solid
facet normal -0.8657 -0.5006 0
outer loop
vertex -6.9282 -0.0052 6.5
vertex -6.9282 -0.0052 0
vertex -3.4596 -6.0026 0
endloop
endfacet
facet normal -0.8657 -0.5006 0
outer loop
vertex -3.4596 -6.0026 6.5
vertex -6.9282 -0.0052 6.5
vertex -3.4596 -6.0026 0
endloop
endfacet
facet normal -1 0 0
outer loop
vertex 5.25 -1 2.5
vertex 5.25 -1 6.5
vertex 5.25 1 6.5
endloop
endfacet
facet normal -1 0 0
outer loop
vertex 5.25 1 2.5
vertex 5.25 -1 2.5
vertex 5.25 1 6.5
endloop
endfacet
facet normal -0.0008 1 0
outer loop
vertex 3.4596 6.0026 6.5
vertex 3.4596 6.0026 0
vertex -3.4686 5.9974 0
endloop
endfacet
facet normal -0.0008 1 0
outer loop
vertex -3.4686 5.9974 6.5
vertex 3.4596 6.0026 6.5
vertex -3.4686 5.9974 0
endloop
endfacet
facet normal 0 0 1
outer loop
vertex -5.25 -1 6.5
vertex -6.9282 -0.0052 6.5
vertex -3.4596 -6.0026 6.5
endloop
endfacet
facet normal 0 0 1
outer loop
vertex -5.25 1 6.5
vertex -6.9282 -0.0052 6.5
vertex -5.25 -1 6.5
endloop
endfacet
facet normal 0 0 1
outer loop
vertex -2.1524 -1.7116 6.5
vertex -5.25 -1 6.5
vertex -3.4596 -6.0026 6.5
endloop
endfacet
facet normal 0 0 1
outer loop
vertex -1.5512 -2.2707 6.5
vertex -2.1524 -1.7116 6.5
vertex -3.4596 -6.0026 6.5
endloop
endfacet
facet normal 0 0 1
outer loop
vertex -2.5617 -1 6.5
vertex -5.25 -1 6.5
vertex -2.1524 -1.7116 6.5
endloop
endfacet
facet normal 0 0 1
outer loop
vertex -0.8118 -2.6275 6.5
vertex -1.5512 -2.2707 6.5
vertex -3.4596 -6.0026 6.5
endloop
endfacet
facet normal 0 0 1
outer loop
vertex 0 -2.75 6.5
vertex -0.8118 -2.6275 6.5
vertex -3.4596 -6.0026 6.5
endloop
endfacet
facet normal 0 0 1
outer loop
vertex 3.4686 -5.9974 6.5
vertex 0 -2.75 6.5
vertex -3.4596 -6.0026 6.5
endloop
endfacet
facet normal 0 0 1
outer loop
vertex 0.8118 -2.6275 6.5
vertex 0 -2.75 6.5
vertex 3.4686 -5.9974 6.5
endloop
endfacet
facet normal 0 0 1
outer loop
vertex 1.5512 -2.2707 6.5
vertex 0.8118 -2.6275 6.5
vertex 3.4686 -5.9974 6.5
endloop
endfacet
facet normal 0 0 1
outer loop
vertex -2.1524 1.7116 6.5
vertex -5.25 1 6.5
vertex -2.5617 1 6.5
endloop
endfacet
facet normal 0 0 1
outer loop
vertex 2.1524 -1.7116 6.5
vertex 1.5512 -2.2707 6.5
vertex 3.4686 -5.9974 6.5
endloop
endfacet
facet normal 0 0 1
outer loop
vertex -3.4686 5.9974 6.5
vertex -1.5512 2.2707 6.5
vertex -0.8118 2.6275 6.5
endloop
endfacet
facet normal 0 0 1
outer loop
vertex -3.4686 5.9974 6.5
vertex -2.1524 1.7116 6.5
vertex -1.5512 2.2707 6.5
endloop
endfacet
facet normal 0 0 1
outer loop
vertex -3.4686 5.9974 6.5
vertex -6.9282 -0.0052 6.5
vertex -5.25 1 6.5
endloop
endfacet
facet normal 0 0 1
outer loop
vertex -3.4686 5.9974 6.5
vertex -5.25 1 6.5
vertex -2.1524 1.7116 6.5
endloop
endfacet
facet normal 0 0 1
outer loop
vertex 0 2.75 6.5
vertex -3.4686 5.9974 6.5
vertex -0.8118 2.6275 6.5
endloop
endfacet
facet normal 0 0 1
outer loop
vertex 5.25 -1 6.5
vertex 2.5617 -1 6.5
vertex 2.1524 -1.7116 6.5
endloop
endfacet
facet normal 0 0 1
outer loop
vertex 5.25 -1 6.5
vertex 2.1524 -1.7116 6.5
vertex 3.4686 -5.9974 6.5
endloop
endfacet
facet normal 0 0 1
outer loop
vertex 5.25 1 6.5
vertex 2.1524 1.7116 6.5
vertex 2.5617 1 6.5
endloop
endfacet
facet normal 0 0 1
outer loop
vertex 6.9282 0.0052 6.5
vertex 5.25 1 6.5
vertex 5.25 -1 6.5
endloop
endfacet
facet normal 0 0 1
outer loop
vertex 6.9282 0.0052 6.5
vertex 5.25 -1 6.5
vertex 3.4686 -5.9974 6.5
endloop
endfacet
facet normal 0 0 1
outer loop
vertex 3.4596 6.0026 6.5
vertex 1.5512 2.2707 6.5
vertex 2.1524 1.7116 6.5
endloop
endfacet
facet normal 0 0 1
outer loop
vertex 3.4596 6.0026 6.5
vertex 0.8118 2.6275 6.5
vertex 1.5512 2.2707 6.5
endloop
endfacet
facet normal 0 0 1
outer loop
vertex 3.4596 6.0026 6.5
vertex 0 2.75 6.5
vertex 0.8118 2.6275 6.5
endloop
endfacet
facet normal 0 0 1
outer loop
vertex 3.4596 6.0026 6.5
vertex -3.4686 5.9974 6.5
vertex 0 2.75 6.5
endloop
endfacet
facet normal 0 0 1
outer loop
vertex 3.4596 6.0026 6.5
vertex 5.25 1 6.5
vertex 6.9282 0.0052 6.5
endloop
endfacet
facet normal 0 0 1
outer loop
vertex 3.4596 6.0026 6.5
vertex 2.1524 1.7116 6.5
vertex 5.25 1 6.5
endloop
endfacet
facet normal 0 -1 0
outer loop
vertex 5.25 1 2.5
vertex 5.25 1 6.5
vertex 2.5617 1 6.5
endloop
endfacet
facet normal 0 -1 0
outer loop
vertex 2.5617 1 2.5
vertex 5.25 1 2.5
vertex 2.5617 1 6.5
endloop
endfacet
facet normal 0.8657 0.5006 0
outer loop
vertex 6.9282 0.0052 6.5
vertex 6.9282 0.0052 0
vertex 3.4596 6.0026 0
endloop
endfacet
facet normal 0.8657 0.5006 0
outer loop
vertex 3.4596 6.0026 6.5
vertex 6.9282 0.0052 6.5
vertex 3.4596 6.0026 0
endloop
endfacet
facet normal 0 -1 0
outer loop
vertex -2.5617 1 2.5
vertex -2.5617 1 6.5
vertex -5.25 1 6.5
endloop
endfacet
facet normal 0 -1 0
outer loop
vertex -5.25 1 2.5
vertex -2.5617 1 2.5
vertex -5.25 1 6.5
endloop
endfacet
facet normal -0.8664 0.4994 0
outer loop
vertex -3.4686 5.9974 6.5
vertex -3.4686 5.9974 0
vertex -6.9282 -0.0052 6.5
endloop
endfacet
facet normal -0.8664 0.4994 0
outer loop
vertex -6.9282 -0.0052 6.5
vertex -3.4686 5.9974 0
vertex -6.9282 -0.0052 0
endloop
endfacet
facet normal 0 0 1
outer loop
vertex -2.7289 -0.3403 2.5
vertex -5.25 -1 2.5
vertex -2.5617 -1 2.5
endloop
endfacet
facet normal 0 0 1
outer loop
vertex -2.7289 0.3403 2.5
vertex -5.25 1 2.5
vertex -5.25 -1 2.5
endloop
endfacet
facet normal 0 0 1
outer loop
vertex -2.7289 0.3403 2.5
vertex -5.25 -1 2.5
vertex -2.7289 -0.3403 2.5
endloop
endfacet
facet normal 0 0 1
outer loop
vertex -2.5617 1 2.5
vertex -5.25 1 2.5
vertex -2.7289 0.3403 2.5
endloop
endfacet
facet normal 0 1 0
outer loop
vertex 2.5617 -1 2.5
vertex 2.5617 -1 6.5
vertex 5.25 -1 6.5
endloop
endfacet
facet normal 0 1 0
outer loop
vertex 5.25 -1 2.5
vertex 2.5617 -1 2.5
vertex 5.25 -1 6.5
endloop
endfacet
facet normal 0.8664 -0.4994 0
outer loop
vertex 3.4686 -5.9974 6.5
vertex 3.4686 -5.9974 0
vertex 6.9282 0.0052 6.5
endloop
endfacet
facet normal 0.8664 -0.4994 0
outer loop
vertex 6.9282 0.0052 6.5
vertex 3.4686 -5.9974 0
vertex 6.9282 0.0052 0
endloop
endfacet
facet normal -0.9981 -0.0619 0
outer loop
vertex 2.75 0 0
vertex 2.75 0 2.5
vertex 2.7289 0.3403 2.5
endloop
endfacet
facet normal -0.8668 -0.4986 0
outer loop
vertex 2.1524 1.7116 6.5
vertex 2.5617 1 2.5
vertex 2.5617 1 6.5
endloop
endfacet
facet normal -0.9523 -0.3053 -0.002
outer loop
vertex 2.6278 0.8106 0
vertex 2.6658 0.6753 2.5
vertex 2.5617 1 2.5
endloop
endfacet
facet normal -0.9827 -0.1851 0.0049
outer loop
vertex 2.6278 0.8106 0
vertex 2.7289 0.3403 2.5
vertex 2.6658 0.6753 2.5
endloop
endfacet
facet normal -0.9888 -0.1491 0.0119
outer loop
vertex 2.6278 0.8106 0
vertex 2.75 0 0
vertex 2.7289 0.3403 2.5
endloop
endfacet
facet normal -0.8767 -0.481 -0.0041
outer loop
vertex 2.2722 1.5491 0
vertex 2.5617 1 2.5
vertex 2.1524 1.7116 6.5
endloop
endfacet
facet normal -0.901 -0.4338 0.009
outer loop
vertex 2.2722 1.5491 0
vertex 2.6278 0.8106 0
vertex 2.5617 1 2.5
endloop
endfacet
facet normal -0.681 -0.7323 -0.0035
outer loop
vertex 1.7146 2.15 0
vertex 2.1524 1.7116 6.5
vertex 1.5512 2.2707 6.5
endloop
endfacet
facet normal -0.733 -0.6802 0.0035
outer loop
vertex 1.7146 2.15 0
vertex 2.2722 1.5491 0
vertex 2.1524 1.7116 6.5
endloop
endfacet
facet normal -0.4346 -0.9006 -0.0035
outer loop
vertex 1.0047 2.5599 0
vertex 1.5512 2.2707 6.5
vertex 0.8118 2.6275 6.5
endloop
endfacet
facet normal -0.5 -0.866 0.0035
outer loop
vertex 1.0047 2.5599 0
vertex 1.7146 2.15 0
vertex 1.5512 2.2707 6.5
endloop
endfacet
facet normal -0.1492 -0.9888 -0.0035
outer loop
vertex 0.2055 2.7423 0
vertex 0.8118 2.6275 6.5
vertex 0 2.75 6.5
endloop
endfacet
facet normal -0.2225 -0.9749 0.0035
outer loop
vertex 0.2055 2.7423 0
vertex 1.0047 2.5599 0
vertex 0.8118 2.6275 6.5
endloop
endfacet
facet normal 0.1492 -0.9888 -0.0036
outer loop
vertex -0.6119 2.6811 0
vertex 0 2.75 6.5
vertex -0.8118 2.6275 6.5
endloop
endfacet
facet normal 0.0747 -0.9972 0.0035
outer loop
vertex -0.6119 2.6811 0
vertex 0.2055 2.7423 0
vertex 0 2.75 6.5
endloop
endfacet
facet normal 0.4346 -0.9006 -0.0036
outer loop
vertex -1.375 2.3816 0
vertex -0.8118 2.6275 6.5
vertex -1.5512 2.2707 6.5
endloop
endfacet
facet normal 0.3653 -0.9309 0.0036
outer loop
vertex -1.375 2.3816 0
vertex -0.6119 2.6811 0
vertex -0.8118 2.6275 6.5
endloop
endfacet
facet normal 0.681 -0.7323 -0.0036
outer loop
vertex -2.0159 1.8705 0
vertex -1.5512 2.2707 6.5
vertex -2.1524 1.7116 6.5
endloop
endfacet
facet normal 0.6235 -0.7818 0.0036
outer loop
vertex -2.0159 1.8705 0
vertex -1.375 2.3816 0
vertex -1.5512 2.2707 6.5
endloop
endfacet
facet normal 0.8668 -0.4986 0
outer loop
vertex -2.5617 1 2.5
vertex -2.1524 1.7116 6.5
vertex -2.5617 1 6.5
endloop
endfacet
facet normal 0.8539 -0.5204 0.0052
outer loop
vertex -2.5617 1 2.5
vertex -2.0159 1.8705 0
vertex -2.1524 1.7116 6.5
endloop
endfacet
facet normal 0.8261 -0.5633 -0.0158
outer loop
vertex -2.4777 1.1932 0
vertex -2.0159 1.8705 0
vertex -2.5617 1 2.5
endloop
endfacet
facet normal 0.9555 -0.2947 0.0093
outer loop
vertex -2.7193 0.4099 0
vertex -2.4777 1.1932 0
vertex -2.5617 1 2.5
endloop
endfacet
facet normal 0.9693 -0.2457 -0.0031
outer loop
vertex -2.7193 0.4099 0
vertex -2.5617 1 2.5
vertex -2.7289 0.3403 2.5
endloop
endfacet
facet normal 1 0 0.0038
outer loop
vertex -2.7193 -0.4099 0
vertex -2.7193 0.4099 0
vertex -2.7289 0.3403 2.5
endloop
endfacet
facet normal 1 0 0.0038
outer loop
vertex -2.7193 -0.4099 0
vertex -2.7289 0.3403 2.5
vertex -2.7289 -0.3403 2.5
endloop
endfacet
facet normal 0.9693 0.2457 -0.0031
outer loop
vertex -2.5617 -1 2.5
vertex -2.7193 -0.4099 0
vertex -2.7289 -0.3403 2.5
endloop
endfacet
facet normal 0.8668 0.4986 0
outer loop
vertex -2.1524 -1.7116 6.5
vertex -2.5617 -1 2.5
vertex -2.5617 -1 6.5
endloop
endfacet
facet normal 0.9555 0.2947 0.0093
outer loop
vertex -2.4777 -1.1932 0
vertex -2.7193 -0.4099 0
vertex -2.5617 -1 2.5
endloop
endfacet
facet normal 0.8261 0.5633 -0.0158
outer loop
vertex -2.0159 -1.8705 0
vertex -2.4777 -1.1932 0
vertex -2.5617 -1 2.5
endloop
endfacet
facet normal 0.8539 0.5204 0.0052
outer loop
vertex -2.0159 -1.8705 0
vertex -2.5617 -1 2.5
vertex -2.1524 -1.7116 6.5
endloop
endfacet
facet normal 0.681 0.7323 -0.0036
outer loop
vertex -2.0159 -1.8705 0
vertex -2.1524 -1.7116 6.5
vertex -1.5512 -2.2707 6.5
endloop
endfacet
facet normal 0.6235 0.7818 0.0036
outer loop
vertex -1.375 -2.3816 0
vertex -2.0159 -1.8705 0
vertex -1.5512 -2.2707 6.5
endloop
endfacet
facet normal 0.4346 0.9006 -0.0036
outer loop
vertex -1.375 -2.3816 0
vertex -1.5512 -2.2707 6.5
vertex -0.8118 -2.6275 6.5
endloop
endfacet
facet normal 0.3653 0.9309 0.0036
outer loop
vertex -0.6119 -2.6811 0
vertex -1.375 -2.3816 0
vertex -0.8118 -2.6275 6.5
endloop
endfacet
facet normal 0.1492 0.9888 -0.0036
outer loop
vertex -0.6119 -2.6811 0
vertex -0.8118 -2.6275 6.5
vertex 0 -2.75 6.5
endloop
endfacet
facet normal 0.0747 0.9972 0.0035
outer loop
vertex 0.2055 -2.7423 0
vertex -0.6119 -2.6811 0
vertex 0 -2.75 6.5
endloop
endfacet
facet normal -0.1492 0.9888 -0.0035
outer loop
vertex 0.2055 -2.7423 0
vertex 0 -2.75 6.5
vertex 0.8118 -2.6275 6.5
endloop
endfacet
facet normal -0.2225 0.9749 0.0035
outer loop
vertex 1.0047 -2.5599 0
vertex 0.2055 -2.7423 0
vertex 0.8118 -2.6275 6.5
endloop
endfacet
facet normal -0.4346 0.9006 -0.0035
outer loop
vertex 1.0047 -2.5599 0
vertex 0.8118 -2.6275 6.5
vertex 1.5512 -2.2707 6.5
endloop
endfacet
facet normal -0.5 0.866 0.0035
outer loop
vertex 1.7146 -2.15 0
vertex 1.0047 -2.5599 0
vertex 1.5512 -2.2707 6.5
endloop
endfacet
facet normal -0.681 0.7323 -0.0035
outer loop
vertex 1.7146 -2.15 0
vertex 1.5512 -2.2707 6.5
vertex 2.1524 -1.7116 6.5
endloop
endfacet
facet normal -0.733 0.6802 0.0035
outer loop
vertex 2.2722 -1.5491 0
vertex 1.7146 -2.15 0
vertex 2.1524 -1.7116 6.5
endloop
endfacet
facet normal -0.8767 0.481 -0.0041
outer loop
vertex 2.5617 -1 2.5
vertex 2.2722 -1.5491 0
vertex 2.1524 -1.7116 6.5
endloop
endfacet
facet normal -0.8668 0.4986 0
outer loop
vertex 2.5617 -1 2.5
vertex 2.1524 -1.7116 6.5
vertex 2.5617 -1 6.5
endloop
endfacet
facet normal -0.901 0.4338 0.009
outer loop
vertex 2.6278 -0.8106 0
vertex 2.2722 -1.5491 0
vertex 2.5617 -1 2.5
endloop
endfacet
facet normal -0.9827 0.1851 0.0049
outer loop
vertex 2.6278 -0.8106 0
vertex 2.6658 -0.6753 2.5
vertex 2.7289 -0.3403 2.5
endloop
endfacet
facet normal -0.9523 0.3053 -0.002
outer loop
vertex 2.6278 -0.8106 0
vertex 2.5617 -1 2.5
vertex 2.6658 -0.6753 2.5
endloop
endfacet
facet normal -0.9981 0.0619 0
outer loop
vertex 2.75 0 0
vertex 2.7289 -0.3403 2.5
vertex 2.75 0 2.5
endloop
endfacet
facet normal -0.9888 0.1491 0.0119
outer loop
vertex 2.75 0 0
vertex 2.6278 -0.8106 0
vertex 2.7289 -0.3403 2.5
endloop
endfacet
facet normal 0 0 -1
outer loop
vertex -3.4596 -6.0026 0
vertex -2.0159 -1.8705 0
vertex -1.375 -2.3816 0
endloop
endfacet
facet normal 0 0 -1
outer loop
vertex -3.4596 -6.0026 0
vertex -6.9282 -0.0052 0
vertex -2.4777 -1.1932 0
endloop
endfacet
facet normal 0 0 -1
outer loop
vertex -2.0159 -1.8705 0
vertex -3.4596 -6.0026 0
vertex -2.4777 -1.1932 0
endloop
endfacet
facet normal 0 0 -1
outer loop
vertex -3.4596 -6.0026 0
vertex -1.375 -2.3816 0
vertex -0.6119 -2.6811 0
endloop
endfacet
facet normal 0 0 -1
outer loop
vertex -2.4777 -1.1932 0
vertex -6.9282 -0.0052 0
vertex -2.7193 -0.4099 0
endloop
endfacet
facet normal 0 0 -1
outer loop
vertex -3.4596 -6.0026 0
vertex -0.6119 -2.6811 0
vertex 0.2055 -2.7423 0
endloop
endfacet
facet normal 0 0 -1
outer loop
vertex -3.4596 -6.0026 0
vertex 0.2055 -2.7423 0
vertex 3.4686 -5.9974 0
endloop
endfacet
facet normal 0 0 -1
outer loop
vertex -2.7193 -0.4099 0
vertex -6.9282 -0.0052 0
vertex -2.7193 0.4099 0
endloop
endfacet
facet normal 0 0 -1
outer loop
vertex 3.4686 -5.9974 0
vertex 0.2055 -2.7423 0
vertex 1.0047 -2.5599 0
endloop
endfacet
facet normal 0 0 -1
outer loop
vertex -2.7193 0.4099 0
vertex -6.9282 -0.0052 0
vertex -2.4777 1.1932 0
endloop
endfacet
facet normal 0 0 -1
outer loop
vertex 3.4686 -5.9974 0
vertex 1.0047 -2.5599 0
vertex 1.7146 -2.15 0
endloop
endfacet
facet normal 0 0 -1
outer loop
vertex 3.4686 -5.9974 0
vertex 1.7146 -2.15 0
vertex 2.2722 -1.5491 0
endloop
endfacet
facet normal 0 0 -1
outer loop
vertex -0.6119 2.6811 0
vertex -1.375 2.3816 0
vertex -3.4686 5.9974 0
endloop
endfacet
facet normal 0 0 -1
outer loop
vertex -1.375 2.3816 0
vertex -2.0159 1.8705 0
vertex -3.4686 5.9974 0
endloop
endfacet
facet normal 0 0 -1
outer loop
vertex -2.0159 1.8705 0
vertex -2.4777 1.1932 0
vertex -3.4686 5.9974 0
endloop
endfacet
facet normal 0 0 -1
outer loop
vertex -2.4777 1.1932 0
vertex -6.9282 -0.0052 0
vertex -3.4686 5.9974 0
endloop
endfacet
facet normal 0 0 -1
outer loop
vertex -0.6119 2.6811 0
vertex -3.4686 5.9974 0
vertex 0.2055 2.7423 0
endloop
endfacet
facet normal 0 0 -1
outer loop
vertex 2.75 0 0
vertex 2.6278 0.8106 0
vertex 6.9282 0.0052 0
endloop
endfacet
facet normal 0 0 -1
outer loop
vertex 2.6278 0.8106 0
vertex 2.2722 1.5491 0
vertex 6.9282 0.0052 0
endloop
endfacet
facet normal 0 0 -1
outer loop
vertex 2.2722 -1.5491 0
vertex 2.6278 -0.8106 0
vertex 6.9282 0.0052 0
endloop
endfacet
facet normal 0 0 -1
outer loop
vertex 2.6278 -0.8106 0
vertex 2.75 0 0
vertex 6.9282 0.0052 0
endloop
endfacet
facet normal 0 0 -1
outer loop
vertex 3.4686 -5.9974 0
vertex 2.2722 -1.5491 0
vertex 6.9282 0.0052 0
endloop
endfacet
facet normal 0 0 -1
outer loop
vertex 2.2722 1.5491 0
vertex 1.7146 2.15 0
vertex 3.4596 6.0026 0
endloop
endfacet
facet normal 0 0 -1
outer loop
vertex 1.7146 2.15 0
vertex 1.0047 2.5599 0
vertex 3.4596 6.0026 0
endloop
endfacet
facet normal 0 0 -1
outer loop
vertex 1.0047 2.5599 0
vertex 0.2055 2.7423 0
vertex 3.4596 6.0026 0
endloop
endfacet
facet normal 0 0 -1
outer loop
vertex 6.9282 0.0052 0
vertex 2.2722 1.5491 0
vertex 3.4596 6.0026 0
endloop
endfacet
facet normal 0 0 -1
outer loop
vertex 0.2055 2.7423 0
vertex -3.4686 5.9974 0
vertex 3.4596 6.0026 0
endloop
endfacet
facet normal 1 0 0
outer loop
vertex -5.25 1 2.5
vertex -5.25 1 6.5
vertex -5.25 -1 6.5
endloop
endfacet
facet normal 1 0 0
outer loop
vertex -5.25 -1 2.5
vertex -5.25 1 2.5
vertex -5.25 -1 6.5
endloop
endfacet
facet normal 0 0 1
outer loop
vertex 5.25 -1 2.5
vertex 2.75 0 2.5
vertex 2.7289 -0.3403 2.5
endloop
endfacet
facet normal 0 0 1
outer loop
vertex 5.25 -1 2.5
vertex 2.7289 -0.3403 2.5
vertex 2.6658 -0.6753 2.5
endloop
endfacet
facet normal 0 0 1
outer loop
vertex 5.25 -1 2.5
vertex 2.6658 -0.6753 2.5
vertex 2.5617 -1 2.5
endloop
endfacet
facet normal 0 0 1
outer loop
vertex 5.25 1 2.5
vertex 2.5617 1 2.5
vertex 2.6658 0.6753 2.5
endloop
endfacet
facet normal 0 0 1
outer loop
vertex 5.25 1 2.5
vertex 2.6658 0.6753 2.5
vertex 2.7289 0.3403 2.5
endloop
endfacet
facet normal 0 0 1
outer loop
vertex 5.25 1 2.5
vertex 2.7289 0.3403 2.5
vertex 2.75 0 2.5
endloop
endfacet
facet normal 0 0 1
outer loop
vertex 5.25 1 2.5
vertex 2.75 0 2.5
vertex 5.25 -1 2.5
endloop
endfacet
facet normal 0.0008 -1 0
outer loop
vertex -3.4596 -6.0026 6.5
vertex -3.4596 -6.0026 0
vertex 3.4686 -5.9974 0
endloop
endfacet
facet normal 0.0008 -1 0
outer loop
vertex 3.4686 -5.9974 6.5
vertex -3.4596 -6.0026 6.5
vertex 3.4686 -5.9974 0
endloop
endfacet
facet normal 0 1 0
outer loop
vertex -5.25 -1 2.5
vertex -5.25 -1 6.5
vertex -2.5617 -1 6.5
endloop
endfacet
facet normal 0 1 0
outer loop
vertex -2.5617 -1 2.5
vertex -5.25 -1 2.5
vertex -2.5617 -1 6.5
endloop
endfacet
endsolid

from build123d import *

# Parameters (mm, degrees)
F0_R     = 2.75
F1_DEPTH = 6.5
F3_DEPTH = 4


with BuildPart() as f1:
    # F0 (on Top) → F1 (new body)
    with BuildSketch(Plane.XY):
        Polygon((3.4686009319, -5.997400068), (6.9282012815, 0.0051964886), (3.4596003496, 6.0025965566), (-3.4686009319, 5.997400068), (-6.9282012815, -0.0051964886), (-3.4596003496, -6.0025965566), align=None)
        Circle(F0_R, mode=Mode.SUBTRACT)
    extrude(amount=F1_DEPTH)

    # F2 (on face) → F3 (cut)
    with BuildSketch(Plane.XY.offset(6.5)):
        with BuildLine():
            Line((-5.25, -1), (-2.5617376915, -1))
            ThreePointArc((-2.5617376915, -1), (-2.75, 0), (-2.5617376915, 1))
            Line((-2.5617376915, 1), (-5.25, 1))
            Line((-5.25, 1), (-5.25, -1))
        make_face()
        with BuildLine():
            Line((2.5617376915, -1), (5.25, -1))
            Line((5.25, -1), (5.25, 1))
            Line((5.25, 1), (2.5617376915, 1))
            ThreePointArc((2.5617376915, 1), (2.7025246208, 0.5087835239), (2.75, 0))
            ThreePointArc((2.75, 0), (2.7025246208, -0.5087835239), (2.5617376915, -1))
        make_face()
    extrude(amount=-F3_DEPTH, mode=Mode.SUBTRACT)


solid = f1.part
